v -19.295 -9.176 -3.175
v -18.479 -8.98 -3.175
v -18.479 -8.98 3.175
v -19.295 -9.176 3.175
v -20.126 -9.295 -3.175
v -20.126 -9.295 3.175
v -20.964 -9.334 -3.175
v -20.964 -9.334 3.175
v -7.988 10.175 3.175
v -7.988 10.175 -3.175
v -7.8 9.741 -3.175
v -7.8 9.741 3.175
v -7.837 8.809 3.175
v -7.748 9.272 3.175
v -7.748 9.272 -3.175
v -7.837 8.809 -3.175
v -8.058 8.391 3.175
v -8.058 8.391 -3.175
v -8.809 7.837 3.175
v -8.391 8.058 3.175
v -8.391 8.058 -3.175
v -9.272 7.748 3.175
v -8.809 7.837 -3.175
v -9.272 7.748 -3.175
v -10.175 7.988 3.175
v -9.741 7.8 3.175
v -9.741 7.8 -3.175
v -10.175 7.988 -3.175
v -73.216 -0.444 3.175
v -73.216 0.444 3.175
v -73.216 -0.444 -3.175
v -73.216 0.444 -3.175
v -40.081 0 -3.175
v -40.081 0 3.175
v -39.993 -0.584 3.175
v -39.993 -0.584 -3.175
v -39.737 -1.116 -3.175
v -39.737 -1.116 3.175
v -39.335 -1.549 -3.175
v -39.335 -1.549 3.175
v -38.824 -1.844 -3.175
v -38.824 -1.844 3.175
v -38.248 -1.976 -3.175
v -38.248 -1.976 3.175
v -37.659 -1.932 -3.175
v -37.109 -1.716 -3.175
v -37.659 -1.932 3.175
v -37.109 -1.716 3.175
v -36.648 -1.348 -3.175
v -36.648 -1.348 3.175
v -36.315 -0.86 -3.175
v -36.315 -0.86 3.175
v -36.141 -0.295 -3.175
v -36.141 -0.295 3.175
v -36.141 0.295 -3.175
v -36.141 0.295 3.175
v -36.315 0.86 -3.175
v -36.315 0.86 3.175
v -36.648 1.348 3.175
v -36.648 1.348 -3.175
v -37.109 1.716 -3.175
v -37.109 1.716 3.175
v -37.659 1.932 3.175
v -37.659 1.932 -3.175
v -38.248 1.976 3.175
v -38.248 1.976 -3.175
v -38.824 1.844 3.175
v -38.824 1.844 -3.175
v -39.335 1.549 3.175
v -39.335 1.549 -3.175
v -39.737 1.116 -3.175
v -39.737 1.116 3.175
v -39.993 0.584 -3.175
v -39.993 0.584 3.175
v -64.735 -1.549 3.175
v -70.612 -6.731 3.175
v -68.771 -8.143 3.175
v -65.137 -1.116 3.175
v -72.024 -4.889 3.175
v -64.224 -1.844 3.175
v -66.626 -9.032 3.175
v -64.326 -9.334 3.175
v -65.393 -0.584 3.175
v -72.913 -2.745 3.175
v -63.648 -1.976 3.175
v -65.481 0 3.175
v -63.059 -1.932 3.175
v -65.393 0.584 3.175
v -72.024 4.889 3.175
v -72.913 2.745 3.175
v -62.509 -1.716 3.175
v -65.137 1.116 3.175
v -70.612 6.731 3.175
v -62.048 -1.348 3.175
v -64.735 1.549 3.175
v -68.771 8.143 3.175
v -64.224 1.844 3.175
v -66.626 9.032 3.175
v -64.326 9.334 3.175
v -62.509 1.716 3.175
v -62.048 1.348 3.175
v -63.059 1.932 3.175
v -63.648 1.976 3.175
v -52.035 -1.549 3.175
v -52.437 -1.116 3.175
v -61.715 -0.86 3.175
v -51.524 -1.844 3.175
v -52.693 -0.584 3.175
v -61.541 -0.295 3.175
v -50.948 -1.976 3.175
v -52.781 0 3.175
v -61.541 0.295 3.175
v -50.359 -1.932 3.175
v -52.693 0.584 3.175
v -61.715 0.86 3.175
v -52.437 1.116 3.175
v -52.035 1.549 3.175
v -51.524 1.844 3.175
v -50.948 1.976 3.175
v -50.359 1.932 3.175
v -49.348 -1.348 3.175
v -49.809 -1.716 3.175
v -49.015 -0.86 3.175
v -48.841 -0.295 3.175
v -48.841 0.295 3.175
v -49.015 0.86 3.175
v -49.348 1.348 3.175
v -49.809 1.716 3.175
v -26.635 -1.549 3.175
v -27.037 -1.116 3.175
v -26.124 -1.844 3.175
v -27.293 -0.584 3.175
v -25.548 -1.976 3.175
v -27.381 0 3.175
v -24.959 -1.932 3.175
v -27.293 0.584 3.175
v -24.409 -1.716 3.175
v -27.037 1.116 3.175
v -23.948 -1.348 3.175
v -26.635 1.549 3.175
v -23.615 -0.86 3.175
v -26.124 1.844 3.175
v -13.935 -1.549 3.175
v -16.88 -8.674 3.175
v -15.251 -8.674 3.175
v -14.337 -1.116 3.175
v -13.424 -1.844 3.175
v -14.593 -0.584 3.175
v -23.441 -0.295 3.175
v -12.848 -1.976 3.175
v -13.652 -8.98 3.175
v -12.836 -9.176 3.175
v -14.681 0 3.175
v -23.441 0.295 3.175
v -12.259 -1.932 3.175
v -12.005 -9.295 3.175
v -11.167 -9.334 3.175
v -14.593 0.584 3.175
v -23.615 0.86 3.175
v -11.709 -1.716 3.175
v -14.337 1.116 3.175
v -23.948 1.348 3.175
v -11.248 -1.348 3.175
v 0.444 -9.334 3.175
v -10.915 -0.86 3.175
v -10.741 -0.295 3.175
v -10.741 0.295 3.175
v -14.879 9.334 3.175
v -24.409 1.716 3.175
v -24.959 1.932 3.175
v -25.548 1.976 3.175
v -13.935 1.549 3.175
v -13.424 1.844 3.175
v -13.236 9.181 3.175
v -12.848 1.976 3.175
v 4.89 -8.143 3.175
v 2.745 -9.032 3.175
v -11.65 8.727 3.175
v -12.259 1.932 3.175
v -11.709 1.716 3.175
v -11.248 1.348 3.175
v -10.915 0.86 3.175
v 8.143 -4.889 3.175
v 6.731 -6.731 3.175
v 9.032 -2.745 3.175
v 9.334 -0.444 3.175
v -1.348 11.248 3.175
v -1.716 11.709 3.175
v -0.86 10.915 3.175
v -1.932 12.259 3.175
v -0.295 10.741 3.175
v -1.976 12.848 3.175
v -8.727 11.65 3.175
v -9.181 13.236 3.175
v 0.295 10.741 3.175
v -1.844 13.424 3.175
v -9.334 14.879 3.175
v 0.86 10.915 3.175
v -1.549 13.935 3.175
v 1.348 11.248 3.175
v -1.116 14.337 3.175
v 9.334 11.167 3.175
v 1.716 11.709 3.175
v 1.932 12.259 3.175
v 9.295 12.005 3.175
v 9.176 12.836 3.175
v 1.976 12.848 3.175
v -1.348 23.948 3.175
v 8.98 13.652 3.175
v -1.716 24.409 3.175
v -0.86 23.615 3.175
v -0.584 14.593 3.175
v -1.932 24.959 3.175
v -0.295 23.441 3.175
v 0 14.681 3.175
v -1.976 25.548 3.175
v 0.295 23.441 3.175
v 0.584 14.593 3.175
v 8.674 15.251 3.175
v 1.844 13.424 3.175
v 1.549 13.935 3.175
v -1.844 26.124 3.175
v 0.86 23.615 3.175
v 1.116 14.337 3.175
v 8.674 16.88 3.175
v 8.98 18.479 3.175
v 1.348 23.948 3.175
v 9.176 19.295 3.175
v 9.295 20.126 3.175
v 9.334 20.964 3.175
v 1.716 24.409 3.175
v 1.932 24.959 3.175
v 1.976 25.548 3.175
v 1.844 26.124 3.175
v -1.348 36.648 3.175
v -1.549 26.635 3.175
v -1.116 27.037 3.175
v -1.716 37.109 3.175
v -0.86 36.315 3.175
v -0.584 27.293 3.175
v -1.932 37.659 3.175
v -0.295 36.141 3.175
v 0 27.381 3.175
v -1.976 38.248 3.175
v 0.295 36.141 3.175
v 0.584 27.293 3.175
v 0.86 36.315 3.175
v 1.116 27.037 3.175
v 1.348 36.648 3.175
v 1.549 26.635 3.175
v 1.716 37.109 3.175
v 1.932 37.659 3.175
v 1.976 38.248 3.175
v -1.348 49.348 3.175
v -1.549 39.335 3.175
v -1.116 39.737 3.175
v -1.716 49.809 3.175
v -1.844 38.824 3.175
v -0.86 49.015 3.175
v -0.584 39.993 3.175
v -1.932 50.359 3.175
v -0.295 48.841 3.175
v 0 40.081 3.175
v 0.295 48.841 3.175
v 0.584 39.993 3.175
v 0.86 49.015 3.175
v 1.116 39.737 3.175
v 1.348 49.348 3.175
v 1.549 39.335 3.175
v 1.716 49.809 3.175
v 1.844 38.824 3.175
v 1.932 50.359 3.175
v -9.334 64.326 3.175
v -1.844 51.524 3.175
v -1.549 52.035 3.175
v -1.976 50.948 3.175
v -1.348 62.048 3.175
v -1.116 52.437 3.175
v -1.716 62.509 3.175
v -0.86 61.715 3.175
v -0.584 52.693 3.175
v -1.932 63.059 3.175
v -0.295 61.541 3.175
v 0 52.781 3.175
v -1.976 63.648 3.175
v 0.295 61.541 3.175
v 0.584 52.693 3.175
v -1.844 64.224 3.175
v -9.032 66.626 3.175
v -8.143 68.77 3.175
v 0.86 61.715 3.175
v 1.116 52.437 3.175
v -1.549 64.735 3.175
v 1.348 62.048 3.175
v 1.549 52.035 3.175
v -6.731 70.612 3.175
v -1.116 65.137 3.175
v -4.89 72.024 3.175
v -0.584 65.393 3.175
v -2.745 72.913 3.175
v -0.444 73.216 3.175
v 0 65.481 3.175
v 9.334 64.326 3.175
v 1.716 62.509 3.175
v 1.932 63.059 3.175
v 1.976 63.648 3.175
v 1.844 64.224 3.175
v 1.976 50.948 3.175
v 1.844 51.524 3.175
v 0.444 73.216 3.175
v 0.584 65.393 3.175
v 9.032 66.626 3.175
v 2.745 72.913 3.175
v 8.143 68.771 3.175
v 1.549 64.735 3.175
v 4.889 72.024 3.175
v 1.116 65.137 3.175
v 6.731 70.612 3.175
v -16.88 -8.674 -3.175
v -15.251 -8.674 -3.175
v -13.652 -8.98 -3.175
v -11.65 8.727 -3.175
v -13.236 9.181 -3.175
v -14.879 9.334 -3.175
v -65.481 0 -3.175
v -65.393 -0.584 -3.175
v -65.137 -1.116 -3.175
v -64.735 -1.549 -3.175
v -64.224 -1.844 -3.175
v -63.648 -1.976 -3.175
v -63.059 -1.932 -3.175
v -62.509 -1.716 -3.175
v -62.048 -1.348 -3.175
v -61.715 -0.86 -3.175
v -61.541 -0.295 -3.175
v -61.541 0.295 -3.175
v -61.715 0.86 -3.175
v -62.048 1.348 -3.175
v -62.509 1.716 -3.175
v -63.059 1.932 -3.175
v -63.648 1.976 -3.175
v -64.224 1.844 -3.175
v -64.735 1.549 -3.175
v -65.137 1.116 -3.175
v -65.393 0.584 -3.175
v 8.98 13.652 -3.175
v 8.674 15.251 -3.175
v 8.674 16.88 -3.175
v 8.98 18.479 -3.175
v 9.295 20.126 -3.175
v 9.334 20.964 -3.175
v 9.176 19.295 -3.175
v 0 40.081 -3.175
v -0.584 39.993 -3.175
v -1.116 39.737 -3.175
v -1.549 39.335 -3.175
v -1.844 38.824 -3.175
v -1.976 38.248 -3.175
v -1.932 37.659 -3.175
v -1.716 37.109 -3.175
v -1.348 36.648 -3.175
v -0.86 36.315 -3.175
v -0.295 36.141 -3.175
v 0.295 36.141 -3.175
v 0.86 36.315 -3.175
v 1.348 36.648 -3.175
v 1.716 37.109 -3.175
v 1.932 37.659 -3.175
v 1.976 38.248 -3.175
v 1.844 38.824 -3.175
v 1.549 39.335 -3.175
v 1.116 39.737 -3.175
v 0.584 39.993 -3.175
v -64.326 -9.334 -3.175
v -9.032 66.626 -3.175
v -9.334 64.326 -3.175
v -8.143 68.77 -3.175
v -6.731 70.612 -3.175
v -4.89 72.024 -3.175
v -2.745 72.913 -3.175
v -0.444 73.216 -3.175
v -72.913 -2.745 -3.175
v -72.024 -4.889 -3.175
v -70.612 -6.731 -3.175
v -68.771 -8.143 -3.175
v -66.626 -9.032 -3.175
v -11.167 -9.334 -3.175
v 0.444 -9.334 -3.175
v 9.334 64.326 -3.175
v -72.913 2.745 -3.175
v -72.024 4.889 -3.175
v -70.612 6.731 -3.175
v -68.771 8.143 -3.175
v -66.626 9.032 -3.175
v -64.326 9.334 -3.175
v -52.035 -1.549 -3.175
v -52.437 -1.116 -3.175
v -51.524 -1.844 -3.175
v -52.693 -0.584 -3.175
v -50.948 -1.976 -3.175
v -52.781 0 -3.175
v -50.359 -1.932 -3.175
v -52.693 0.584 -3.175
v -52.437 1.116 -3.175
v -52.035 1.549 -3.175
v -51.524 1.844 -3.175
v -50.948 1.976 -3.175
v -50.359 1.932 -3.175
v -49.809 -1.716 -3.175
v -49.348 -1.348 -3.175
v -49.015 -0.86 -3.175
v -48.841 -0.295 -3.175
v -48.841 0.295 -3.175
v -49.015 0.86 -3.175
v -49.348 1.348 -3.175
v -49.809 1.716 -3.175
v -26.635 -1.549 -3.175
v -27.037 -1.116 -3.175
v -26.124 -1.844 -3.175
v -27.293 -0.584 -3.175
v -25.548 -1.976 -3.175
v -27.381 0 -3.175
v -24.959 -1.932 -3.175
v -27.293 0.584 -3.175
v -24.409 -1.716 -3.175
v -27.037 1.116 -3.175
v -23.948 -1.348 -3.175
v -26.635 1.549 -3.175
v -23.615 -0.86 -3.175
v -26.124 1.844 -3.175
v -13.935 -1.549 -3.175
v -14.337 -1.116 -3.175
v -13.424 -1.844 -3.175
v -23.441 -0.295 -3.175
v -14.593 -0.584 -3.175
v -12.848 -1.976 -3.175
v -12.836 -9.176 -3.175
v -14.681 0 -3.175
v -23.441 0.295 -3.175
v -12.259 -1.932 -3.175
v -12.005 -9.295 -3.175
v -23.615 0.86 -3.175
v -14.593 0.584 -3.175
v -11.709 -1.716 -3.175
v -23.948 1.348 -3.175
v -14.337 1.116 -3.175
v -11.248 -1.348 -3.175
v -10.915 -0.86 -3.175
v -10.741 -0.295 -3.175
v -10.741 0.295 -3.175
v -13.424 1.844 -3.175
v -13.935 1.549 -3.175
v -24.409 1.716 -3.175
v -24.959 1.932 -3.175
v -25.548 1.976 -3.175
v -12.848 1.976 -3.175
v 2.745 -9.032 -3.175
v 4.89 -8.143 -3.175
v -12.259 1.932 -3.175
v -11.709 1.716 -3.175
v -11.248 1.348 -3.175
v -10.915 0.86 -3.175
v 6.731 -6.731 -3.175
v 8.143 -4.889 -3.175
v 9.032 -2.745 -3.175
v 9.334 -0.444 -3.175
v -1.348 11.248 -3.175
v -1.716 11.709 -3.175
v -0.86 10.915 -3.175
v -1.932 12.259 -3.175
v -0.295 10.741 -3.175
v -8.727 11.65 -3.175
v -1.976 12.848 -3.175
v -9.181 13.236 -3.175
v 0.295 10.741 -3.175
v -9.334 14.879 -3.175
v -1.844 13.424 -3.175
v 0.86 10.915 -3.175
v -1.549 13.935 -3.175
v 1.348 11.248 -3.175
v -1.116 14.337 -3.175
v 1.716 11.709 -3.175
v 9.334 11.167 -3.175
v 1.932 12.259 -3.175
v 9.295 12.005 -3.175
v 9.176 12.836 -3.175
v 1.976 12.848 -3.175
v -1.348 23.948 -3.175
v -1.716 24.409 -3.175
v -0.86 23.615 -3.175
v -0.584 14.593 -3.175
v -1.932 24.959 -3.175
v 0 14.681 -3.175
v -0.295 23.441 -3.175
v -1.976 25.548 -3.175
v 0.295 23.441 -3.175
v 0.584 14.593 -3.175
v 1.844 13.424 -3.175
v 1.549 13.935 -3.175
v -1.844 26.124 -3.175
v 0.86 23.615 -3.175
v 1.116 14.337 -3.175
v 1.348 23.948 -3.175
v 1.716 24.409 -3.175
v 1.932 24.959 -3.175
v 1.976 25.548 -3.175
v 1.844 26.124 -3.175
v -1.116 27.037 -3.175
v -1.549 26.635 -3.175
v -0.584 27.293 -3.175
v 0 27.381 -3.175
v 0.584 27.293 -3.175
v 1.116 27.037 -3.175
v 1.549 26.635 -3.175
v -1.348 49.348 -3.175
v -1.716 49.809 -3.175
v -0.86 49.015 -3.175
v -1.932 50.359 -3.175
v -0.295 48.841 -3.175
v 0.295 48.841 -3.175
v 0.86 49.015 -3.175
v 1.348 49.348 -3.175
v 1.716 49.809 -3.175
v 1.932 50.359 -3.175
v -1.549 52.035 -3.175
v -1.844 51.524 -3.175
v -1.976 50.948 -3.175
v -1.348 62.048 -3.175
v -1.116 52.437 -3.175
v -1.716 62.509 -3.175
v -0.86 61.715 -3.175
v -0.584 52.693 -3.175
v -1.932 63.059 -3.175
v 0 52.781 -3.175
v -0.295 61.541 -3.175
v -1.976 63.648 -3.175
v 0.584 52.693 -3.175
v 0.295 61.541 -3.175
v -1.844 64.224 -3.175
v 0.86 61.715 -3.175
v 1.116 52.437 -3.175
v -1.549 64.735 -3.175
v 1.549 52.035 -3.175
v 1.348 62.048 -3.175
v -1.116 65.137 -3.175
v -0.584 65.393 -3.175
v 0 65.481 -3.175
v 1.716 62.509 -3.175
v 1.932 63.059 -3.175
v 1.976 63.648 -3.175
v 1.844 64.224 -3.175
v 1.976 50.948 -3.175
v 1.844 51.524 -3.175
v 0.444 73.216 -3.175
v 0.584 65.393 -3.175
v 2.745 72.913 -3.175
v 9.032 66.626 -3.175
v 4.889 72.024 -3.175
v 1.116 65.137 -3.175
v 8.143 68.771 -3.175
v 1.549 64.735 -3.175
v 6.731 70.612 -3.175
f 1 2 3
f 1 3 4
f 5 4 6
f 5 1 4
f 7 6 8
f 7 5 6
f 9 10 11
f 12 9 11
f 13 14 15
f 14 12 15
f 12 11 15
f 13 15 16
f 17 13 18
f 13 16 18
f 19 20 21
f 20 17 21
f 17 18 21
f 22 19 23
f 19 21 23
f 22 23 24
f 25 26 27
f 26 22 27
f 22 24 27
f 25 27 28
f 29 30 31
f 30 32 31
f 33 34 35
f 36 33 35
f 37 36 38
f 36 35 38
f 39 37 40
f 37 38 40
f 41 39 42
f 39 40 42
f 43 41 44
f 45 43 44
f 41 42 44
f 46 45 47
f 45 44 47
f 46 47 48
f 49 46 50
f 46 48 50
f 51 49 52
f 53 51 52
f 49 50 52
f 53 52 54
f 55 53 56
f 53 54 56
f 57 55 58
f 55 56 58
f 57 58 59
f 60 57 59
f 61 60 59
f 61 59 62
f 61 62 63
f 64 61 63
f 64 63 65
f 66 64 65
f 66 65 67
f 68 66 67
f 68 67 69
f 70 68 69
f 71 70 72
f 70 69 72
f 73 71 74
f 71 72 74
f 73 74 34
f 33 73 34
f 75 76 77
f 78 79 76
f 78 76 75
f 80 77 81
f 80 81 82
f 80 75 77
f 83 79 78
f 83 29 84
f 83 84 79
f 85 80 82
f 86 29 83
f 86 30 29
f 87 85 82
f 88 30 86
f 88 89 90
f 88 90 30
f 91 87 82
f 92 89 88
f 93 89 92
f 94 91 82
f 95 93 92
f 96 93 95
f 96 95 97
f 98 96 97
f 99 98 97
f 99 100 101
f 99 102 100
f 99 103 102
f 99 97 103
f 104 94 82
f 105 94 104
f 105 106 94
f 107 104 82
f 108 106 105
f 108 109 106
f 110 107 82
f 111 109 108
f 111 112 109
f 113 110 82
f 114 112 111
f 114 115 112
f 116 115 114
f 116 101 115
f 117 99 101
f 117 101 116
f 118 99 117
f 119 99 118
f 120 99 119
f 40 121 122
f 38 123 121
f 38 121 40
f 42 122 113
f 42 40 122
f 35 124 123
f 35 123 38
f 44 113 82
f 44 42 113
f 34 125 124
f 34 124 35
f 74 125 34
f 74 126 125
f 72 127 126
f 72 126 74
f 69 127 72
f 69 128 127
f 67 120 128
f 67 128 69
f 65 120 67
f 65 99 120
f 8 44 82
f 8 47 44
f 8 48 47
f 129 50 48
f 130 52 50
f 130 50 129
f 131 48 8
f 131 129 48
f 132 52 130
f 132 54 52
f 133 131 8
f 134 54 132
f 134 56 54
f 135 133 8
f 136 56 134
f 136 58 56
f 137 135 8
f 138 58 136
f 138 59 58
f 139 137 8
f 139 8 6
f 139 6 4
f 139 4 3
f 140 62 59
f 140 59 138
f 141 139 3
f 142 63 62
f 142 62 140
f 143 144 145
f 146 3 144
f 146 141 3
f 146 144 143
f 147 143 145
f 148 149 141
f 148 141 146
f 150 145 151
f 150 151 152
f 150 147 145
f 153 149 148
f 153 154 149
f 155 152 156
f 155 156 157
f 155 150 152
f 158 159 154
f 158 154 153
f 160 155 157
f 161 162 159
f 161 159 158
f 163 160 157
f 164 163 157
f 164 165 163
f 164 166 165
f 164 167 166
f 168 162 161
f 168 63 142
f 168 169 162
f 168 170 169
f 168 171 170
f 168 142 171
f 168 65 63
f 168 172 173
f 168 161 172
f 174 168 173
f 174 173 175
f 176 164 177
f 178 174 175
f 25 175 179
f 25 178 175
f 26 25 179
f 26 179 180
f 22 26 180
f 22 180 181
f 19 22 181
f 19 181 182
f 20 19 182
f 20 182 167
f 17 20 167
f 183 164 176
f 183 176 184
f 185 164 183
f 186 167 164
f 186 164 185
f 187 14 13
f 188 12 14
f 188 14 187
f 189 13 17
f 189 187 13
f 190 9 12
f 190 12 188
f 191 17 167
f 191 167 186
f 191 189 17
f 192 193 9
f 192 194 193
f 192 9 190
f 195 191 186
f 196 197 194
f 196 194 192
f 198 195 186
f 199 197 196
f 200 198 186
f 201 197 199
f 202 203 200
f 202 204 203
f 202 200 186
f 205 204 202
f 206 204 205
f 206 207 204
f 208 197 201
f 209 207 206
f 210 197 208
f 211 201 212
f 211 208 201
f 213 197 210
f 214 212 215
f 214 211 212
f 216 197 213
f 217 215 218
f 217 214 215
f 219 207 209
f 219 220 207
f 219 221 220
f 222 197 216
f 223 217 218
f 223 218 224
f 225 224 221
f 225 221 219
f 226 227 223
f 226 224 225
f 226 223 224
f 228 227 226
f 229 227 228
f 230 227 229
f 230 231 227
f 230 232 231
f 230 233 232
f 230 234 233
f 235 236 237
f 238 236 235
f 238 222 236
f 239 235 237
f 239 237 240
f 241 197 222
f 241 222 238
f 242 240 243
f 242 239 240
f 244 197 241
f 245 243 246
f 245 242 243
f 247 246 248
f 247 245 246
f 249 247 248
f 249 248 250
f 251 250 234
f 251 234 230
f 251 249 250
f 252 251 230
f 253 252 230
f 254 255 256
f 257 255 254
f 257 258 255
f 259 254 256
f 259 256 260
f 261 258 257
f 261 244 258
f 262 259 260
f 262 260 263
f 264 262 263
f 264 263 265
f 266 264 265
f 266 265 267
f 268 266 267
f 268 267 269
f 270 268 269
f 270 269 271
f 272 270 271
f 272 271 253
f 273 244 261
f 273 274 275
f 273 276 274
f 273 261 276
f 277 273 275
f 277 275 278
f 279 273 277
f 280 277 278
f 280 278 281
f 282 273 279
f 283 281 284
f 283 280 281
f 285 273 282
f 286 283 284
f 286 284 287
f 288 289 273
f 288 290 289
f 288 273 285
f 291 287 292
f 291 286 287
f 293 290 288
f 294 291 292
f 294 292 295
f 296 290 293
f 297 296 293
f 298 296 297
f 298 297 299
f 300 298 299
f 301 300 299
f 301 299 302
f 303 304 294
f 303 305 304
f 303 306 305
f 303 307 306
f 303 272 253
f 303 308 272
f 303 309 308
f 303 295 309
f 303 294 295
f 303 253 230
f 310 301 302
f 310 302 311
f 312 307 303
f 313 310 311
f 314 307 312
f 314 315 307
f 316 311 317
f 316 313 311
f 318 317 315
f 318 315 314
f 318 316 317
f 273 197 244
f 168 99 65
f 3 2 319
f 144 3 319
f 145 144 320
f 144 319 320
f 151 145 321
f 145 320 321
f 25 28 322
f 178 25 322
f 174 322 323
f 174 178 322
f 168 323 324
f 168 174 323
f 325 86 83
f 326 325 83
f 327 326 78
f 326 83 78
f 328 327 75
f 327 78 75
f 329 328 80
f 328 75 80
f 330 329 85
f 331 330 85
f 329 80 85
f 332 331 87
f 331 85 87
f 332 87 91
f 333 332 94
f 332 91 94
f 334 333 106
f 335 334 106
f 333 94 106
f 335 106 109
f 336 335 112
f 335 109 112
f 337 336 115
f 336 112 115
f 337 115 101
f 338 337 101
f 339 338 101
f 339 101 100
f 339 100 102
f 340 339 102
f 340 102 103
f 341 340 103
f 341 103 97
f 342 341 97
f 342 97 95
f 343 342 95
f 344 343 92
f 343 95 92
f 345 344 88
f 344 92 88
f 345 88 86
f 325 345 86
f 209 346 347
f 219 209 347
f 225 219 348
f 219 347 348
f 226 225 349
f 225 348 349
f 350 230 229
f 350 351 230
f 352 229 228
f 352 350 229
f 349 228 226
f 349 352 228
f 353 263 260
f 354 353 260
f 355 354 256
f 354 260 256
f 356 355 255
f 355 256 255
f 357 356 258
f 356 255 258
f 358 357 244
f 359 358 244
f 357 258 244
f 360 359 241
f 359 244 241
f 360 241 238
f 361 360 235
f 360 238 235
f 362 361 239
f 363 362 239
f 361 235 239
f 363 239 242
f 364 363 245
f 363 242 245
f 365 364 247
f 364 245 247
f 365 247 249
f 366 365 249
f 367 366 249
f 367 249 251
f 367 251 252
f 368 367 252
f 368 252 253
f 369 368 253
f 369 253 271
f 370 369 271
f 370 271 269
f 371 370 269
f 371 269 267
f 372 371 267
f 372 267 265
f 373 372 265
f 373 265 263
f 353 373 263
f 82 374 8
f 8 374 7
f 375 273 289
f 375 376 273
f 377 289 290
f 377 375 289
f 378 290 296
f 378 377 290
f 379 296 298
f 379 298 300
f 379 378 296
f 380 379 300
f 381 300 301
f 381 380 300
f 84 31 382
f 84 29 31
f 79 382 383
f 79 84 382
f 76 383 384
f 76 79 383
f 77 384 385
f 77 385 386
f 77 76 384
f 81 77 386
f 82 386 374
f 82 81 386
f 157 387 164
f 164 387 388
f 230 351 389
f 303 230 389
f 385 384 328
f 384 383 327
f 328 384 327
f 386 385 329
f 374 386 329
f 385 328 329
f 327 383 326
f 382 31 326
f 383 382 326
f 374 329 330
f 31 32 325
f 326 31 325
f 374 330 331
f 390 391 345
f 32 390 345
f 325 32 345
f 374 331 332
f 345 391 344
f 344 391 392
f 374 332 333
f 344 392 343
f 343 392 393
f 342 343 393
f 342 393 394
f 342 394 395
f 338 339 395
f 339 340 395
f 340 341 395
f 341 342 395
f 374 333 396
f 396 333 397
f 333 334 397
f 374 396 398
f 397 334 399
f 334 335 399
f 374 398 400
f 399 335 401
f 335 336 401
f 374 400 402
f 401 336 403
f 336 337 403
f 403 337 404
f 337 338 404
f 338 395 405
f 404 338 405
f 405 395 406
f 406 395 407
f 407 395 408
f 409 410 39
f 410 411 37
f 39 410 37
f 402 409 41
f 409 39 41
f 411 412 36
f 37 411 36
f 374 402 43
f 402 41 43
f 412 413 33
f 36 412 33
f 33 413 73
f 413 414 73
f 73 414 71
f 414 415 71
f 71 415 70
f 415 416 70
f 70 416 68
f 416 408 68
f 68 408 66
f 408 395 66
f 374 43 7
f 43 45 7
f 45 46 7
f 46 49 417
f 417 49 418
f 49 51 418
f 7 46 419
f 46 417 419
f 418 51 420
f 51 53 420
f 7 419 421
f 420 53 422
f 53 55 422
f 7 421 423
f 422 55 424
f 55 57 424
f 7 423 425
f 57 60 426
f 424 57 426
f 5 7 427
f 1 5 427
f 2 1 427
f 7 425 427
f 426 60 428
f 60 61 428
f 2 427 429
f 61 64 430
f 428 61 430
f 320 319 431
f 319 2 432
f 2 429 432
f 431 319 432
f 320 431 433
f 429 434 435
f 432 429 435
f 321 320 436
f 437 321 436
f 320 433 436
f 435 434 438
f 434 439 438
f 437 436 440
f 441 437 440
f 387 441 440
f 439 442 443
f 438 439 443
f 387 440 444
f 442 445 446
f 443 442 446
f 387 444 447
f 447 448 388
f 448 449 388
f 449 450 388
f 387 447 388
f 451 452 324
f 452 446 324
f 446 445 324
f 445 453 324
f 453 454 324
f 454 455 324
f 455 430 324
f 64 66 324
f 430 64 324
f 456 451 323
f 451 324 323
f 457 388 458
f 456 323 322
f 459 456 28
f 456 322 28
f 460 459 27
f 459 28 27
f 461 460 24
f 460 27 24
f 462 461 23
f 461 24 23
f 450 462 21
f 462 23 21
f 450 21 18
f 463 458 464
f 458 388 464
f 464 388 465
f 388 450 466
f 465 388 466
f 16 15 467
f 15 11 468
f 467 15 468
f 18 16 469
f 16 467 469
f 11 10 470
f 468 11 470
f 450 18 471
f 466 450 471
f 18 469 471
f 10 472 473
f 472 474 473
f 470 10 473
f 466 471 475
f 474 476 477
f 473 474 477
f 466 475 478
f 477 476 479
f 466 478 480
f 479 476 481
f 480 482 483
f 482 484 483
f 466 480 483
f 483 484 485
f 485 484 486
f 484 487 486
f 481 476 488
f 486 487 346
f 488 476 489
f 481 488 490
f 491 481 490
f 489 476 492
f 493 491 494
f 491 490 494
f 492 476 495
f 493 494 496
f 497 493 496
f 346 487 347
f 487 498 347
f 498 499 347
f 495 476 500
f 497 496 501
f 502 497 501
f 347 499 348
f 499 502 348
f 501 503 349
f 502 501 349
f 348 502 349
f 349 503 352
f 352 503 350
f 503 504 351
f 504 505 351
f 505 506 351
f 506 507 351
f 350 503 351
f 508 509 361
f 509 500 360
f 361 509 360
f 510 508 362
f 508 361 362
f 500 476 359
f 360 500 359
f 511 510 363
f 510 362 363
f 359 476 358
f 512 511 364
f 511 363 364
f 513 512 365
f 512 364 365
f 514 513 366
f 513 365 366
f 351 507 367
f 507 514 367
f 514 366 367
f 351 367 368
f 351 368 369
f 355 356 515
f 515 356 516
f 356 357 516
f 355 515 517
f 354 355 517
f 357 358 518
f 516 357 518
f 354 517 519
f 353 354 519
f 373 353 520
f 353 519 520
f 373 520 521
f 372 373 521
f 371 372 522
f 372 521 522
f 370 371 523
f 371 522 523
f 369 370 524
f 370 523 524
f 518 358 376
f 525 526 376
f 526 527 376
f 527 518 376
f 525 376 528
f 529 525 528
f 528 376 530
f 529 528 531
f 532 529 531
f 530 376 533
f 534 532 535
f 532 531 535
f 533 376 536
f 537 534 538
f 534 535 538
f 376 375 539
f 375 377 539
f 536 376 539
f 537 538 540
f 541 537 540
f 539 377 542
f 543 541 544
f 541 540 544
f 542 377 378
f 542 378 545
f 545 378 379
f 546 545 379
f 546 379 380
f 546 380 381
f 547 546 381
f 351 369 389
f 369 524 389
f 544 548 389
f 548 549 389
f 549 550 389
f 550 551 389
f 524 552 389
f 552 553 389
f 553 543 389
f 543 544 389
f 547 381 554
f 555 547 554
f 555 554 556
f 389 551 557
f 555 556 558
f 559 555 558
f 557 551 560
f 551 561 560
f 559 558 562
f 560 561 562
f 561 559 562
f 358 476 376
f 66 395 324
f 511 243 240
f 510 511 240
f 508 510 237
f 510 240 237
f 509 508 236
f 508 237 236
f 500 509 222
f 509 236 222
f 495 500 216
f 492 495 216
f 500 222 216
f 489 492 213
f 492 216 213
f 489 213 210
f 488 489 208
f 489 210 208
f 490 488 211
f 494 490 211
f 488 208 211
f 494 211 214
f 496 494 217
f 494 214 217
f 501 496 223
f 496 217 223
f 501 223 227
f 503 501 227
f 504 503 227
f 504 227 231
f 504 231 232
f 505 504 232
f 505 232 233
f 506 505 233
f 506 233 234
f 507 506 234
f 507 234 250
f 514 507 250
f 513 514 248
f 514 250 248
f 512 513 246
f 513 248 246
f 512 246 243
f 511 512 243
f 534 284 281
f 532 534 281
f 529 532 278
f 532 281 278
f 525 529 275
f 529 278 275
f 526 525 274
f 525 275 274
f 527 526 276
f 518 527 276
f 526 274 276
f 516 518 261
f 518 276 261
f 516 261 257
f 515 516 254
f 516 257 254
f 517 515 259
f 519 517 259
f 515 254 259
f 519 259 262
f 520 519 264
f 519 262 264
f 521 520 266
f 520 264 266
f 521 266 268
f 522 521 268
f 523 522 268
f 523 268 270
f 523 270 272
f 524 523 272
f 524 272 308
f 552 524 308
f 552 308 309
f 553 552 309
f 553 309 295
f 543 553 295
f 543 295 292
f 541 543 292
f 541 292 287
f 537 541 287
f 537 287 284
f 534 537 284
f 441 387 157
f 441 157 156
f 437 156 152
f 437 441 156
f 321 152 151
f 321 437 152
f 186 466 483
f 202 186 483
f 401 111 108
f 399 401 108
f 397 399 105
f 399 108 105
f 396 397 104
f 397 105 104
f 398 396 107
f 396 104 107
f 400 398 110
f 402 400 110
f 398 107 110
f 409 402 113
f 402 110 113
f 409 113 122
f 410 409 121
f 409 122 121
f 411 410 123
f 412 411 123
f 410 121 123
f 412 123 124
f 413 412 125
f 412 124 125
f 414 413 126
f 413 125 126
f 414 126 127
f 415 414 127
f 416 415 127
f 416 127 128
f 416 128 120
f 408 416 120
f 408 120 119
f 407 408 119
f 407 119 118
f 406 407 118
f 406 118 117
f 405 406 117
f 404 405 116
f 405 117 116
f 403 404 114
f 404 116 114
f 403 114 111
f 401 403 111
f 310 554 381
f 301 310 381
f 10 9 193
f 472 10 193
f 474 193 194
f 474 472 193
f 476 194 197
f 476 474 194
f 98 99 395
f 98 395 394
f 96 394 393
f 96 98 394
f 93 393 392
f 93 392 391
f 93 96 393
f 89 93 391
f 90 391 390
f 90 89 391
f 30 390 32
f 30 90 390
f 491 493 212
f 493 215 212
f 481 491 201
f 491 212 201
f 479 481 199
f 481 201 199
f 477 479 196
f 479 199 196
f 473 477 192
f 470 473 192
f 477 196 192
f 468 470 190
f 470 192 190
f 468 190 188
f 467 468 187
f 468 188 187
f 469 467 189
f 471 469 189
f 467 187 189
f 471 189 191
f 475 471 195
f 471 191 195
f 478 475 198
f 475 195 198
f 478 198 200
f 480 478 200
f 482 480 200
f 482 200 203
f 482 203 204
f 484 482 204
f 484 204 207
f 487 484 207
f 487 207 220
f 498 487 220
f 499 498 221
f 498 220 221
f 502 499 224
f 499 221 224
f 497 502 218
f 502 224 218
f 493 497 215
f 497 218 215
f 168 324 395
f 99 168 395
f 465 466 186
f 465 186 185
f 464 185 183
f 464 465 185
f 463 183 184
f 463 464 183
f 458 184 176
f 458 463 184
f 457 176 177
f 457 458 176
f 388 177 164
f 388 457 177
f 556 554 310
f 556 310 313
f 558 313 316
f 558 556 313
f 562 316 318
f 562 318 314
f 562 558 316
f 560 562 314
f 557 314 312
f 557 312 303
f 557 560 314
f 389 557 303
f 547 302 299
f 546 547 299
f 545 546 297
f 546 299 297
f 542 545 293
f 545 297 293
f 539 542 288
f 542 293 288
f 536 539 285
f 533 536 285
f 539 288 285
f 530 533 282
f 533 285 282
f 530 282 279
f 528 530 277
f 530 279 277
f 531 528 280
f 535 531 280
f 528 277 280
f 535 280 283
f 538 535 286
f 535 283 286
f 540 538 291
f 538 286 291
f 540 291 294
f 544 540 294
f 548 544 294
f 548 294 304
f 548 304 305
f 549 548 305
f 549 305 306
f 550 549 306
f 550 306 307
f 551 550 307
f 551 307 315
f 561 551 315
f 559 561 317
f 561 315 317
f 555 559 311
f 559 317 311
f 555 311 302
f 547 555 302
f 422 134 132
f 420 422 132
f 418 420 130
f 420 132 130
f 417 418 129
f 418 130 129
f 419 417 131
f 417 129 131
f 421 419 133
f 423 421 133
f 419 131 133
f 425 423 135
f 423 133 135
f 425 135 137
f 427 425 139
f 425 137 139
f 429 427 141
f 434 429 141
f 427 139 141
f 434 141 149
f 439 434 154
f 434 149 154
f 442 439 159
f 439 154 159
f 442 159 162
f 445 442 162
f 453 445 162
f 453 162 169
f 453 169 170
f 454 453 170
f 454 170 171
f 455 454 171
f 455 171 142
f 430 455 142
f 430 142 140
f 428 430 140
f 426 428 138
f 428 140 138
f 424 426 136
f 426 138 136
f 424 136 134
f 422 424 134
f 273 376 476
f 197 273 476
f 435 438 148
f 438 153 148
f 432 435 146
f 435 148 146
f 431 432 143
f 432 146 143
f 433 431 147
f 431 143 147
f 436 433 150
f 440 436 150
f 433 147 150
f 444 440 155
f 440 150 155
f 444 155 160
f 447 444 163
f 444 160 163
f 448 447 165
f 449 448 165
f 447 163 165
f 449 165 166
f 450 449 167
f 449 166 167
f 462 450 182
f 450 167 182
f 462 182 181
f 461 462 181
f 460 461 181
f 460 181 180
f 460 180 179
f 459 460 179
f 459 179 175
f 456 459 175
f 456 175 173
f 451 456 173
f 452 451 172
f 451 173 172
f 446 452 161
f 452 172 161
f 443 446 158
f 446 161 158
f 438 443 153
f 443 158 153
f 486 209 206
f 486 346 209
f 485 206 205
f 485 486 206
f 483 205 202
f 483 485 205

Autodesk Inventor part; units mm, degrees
ref_plane "YZ Plane" through (0, 0, 0) normal (1, 0, 0) x (0, 1, 0)
ref_plane "XZ Plane" through (0, 0, 0) normal (0, 1, 0) x (-1, 0, 0)
ref_plane "XY Plane" through (0, 0, 0) normal (0, 0, 1) x (1, 0, 0)
sketch "Sketch1" plane through (0, 0, 0) normal (0, 0, 1) x (1, 0, 0)
  line L0 (-9.3345, 9.3345) -> (-73.2155, 9.3345)
  line L1 (-73.2155, 9.3345) -> (-73.2155, -9.3345)
  line L2 (-73.2155, -9.3345) -> (9.3345, -9.3345)
  line L3 (9.3345, -9.3345) -> (9.3345, 73.2155)
  line L4 (9.3345, 73.2155) -> (-9.3345, 73.2155)
  line L5 (0, 73.2155) -> (0, 0) construction
  line L6 (0, 0) -> (-73.2155, 0) construction
  line L7 (-9.3345, 73.2155) -> (-9.3345, 9.3345)
  line L8 (-12.7, 12.7) -> (-76.581, 12.7) construction
  line L9 (-76.581, 12.7) -> (-76.581, -12.7) construction
  line L10 (-76.581, -12.7) -> (12.7, -12.7) construction
  line L11 (12.7, -12.7) -> (12.7, 76.581) construction
  line L12 (12.7, 76.581) -> (-12.7, 76.581) construction
  line L13 (-12.7, 76.581) -> (-12.7, 12.7) construction
  line L14 (9.3345, -9.3345) -> (-9.3345, 9.3345) construction
  arc A0 (-10.922, 9.3345) -> (-9.3345, 10.922) centre (-9.3345, 9.3345) ccw
  circle A1 centre (17.272, 16.0655) radius 8.636
  circle A2 centre (-16.0655, -17.272) radius 8.636
  point P0 (9.3345, 12.6631)
  point P1 (9.3345, 19.4679)
  point P2 (-19.4679, -9.3345)
  point P3 (-12.6631, -9.3345)
  dimension "d1" = 18.669
  dimension "d2" = 82.55
  dimension "d14" = 25.4
  dimension "d48" = 1.5875
  dimension "d57" = 7.9375
  dimension "d58" = 17.272
  dimension "d59" = 25.4
extrude "Plate1" add sketch "Sketch1" along normal mid plane 6.35 contours A0 L7 L4 L3 A1 L2 A2 L1 L0
sketch "Sketch3" plane through (0, 0, -3.175) normal (0, 0, -1) x (-1, 0, 0)
  line L0 (0, 0) -> (0, 73.2155) construction
  line L1 (-9.3345, 73.2155) -> (9.3345, 73.2155) construction
  line L2 (73.2155, -9.3345) -> (-9.3345, -9.3345) construction
  point P0 (0, 12.7)
  point P1 (0, 25.4)
  point P2 (0, 38.1)
  point P3 (0, 50.8)
  point P4 (0, 63.5)
  dimension "d33" = 22.0345
  dimension "d36" = 12.7
hole "Hole3" at (0, 12.7, -3.175) at (0, 25.4, -3.175) at (0, 38.1, -3.175) at (0, 50.8, -3.175) at (0, 63.5, -3.175) direction (0, 0, 1) diameter 3.9624 end through all thread size "10-32 UNF" class "2B" standard "ANSI Unified Screw Threads"
pattern_circular "Circular Pattern1" count 2 over 90 about axis through (0, 0, -10) along (0, 0, 1) of "Hole3"
fillet "Corner Round1" radius 8.89 11 edges at (-9.3345, 73.2155, 0) (9.3345, 73.2155, 0) (-9.3345, 10.922, 0) (9.3345, -9.3345, 0) (-73.2155, 9.3345, 0) (-73.2155, -9.3345, 0) (-10.922, 9.3345, 0) (-19.4679, -9.3345, 0) (-12.6631, -9.3345, 0) (9.3345, 19.4679, 0) (9.3345, 12.6631, 0)
equation "\"d32\" = Thickness"
equation "\"BendRadius\" = Thickness"
equation "\"BendReliefWidth\" = Thickness"
equation "\"BendReliefDepth\" = 0.5 * Thickness"
equation "\"CornerReliefSize\" = 4 * Thickness"
equation "\"MinimumRemnant\" = 2 * Thickness"
equation "\"TransitionRadius\" = BendRadius"
equation "\"JacobiRadiusSize\" = BendRadius"
equation "\"GapSize\" = Thickness"
equation "\"Thickness\" = 6.35"
properties part number "PLATE,BRACKET,ELEVATOR,STAGE1" material "Aluminum 7075"
